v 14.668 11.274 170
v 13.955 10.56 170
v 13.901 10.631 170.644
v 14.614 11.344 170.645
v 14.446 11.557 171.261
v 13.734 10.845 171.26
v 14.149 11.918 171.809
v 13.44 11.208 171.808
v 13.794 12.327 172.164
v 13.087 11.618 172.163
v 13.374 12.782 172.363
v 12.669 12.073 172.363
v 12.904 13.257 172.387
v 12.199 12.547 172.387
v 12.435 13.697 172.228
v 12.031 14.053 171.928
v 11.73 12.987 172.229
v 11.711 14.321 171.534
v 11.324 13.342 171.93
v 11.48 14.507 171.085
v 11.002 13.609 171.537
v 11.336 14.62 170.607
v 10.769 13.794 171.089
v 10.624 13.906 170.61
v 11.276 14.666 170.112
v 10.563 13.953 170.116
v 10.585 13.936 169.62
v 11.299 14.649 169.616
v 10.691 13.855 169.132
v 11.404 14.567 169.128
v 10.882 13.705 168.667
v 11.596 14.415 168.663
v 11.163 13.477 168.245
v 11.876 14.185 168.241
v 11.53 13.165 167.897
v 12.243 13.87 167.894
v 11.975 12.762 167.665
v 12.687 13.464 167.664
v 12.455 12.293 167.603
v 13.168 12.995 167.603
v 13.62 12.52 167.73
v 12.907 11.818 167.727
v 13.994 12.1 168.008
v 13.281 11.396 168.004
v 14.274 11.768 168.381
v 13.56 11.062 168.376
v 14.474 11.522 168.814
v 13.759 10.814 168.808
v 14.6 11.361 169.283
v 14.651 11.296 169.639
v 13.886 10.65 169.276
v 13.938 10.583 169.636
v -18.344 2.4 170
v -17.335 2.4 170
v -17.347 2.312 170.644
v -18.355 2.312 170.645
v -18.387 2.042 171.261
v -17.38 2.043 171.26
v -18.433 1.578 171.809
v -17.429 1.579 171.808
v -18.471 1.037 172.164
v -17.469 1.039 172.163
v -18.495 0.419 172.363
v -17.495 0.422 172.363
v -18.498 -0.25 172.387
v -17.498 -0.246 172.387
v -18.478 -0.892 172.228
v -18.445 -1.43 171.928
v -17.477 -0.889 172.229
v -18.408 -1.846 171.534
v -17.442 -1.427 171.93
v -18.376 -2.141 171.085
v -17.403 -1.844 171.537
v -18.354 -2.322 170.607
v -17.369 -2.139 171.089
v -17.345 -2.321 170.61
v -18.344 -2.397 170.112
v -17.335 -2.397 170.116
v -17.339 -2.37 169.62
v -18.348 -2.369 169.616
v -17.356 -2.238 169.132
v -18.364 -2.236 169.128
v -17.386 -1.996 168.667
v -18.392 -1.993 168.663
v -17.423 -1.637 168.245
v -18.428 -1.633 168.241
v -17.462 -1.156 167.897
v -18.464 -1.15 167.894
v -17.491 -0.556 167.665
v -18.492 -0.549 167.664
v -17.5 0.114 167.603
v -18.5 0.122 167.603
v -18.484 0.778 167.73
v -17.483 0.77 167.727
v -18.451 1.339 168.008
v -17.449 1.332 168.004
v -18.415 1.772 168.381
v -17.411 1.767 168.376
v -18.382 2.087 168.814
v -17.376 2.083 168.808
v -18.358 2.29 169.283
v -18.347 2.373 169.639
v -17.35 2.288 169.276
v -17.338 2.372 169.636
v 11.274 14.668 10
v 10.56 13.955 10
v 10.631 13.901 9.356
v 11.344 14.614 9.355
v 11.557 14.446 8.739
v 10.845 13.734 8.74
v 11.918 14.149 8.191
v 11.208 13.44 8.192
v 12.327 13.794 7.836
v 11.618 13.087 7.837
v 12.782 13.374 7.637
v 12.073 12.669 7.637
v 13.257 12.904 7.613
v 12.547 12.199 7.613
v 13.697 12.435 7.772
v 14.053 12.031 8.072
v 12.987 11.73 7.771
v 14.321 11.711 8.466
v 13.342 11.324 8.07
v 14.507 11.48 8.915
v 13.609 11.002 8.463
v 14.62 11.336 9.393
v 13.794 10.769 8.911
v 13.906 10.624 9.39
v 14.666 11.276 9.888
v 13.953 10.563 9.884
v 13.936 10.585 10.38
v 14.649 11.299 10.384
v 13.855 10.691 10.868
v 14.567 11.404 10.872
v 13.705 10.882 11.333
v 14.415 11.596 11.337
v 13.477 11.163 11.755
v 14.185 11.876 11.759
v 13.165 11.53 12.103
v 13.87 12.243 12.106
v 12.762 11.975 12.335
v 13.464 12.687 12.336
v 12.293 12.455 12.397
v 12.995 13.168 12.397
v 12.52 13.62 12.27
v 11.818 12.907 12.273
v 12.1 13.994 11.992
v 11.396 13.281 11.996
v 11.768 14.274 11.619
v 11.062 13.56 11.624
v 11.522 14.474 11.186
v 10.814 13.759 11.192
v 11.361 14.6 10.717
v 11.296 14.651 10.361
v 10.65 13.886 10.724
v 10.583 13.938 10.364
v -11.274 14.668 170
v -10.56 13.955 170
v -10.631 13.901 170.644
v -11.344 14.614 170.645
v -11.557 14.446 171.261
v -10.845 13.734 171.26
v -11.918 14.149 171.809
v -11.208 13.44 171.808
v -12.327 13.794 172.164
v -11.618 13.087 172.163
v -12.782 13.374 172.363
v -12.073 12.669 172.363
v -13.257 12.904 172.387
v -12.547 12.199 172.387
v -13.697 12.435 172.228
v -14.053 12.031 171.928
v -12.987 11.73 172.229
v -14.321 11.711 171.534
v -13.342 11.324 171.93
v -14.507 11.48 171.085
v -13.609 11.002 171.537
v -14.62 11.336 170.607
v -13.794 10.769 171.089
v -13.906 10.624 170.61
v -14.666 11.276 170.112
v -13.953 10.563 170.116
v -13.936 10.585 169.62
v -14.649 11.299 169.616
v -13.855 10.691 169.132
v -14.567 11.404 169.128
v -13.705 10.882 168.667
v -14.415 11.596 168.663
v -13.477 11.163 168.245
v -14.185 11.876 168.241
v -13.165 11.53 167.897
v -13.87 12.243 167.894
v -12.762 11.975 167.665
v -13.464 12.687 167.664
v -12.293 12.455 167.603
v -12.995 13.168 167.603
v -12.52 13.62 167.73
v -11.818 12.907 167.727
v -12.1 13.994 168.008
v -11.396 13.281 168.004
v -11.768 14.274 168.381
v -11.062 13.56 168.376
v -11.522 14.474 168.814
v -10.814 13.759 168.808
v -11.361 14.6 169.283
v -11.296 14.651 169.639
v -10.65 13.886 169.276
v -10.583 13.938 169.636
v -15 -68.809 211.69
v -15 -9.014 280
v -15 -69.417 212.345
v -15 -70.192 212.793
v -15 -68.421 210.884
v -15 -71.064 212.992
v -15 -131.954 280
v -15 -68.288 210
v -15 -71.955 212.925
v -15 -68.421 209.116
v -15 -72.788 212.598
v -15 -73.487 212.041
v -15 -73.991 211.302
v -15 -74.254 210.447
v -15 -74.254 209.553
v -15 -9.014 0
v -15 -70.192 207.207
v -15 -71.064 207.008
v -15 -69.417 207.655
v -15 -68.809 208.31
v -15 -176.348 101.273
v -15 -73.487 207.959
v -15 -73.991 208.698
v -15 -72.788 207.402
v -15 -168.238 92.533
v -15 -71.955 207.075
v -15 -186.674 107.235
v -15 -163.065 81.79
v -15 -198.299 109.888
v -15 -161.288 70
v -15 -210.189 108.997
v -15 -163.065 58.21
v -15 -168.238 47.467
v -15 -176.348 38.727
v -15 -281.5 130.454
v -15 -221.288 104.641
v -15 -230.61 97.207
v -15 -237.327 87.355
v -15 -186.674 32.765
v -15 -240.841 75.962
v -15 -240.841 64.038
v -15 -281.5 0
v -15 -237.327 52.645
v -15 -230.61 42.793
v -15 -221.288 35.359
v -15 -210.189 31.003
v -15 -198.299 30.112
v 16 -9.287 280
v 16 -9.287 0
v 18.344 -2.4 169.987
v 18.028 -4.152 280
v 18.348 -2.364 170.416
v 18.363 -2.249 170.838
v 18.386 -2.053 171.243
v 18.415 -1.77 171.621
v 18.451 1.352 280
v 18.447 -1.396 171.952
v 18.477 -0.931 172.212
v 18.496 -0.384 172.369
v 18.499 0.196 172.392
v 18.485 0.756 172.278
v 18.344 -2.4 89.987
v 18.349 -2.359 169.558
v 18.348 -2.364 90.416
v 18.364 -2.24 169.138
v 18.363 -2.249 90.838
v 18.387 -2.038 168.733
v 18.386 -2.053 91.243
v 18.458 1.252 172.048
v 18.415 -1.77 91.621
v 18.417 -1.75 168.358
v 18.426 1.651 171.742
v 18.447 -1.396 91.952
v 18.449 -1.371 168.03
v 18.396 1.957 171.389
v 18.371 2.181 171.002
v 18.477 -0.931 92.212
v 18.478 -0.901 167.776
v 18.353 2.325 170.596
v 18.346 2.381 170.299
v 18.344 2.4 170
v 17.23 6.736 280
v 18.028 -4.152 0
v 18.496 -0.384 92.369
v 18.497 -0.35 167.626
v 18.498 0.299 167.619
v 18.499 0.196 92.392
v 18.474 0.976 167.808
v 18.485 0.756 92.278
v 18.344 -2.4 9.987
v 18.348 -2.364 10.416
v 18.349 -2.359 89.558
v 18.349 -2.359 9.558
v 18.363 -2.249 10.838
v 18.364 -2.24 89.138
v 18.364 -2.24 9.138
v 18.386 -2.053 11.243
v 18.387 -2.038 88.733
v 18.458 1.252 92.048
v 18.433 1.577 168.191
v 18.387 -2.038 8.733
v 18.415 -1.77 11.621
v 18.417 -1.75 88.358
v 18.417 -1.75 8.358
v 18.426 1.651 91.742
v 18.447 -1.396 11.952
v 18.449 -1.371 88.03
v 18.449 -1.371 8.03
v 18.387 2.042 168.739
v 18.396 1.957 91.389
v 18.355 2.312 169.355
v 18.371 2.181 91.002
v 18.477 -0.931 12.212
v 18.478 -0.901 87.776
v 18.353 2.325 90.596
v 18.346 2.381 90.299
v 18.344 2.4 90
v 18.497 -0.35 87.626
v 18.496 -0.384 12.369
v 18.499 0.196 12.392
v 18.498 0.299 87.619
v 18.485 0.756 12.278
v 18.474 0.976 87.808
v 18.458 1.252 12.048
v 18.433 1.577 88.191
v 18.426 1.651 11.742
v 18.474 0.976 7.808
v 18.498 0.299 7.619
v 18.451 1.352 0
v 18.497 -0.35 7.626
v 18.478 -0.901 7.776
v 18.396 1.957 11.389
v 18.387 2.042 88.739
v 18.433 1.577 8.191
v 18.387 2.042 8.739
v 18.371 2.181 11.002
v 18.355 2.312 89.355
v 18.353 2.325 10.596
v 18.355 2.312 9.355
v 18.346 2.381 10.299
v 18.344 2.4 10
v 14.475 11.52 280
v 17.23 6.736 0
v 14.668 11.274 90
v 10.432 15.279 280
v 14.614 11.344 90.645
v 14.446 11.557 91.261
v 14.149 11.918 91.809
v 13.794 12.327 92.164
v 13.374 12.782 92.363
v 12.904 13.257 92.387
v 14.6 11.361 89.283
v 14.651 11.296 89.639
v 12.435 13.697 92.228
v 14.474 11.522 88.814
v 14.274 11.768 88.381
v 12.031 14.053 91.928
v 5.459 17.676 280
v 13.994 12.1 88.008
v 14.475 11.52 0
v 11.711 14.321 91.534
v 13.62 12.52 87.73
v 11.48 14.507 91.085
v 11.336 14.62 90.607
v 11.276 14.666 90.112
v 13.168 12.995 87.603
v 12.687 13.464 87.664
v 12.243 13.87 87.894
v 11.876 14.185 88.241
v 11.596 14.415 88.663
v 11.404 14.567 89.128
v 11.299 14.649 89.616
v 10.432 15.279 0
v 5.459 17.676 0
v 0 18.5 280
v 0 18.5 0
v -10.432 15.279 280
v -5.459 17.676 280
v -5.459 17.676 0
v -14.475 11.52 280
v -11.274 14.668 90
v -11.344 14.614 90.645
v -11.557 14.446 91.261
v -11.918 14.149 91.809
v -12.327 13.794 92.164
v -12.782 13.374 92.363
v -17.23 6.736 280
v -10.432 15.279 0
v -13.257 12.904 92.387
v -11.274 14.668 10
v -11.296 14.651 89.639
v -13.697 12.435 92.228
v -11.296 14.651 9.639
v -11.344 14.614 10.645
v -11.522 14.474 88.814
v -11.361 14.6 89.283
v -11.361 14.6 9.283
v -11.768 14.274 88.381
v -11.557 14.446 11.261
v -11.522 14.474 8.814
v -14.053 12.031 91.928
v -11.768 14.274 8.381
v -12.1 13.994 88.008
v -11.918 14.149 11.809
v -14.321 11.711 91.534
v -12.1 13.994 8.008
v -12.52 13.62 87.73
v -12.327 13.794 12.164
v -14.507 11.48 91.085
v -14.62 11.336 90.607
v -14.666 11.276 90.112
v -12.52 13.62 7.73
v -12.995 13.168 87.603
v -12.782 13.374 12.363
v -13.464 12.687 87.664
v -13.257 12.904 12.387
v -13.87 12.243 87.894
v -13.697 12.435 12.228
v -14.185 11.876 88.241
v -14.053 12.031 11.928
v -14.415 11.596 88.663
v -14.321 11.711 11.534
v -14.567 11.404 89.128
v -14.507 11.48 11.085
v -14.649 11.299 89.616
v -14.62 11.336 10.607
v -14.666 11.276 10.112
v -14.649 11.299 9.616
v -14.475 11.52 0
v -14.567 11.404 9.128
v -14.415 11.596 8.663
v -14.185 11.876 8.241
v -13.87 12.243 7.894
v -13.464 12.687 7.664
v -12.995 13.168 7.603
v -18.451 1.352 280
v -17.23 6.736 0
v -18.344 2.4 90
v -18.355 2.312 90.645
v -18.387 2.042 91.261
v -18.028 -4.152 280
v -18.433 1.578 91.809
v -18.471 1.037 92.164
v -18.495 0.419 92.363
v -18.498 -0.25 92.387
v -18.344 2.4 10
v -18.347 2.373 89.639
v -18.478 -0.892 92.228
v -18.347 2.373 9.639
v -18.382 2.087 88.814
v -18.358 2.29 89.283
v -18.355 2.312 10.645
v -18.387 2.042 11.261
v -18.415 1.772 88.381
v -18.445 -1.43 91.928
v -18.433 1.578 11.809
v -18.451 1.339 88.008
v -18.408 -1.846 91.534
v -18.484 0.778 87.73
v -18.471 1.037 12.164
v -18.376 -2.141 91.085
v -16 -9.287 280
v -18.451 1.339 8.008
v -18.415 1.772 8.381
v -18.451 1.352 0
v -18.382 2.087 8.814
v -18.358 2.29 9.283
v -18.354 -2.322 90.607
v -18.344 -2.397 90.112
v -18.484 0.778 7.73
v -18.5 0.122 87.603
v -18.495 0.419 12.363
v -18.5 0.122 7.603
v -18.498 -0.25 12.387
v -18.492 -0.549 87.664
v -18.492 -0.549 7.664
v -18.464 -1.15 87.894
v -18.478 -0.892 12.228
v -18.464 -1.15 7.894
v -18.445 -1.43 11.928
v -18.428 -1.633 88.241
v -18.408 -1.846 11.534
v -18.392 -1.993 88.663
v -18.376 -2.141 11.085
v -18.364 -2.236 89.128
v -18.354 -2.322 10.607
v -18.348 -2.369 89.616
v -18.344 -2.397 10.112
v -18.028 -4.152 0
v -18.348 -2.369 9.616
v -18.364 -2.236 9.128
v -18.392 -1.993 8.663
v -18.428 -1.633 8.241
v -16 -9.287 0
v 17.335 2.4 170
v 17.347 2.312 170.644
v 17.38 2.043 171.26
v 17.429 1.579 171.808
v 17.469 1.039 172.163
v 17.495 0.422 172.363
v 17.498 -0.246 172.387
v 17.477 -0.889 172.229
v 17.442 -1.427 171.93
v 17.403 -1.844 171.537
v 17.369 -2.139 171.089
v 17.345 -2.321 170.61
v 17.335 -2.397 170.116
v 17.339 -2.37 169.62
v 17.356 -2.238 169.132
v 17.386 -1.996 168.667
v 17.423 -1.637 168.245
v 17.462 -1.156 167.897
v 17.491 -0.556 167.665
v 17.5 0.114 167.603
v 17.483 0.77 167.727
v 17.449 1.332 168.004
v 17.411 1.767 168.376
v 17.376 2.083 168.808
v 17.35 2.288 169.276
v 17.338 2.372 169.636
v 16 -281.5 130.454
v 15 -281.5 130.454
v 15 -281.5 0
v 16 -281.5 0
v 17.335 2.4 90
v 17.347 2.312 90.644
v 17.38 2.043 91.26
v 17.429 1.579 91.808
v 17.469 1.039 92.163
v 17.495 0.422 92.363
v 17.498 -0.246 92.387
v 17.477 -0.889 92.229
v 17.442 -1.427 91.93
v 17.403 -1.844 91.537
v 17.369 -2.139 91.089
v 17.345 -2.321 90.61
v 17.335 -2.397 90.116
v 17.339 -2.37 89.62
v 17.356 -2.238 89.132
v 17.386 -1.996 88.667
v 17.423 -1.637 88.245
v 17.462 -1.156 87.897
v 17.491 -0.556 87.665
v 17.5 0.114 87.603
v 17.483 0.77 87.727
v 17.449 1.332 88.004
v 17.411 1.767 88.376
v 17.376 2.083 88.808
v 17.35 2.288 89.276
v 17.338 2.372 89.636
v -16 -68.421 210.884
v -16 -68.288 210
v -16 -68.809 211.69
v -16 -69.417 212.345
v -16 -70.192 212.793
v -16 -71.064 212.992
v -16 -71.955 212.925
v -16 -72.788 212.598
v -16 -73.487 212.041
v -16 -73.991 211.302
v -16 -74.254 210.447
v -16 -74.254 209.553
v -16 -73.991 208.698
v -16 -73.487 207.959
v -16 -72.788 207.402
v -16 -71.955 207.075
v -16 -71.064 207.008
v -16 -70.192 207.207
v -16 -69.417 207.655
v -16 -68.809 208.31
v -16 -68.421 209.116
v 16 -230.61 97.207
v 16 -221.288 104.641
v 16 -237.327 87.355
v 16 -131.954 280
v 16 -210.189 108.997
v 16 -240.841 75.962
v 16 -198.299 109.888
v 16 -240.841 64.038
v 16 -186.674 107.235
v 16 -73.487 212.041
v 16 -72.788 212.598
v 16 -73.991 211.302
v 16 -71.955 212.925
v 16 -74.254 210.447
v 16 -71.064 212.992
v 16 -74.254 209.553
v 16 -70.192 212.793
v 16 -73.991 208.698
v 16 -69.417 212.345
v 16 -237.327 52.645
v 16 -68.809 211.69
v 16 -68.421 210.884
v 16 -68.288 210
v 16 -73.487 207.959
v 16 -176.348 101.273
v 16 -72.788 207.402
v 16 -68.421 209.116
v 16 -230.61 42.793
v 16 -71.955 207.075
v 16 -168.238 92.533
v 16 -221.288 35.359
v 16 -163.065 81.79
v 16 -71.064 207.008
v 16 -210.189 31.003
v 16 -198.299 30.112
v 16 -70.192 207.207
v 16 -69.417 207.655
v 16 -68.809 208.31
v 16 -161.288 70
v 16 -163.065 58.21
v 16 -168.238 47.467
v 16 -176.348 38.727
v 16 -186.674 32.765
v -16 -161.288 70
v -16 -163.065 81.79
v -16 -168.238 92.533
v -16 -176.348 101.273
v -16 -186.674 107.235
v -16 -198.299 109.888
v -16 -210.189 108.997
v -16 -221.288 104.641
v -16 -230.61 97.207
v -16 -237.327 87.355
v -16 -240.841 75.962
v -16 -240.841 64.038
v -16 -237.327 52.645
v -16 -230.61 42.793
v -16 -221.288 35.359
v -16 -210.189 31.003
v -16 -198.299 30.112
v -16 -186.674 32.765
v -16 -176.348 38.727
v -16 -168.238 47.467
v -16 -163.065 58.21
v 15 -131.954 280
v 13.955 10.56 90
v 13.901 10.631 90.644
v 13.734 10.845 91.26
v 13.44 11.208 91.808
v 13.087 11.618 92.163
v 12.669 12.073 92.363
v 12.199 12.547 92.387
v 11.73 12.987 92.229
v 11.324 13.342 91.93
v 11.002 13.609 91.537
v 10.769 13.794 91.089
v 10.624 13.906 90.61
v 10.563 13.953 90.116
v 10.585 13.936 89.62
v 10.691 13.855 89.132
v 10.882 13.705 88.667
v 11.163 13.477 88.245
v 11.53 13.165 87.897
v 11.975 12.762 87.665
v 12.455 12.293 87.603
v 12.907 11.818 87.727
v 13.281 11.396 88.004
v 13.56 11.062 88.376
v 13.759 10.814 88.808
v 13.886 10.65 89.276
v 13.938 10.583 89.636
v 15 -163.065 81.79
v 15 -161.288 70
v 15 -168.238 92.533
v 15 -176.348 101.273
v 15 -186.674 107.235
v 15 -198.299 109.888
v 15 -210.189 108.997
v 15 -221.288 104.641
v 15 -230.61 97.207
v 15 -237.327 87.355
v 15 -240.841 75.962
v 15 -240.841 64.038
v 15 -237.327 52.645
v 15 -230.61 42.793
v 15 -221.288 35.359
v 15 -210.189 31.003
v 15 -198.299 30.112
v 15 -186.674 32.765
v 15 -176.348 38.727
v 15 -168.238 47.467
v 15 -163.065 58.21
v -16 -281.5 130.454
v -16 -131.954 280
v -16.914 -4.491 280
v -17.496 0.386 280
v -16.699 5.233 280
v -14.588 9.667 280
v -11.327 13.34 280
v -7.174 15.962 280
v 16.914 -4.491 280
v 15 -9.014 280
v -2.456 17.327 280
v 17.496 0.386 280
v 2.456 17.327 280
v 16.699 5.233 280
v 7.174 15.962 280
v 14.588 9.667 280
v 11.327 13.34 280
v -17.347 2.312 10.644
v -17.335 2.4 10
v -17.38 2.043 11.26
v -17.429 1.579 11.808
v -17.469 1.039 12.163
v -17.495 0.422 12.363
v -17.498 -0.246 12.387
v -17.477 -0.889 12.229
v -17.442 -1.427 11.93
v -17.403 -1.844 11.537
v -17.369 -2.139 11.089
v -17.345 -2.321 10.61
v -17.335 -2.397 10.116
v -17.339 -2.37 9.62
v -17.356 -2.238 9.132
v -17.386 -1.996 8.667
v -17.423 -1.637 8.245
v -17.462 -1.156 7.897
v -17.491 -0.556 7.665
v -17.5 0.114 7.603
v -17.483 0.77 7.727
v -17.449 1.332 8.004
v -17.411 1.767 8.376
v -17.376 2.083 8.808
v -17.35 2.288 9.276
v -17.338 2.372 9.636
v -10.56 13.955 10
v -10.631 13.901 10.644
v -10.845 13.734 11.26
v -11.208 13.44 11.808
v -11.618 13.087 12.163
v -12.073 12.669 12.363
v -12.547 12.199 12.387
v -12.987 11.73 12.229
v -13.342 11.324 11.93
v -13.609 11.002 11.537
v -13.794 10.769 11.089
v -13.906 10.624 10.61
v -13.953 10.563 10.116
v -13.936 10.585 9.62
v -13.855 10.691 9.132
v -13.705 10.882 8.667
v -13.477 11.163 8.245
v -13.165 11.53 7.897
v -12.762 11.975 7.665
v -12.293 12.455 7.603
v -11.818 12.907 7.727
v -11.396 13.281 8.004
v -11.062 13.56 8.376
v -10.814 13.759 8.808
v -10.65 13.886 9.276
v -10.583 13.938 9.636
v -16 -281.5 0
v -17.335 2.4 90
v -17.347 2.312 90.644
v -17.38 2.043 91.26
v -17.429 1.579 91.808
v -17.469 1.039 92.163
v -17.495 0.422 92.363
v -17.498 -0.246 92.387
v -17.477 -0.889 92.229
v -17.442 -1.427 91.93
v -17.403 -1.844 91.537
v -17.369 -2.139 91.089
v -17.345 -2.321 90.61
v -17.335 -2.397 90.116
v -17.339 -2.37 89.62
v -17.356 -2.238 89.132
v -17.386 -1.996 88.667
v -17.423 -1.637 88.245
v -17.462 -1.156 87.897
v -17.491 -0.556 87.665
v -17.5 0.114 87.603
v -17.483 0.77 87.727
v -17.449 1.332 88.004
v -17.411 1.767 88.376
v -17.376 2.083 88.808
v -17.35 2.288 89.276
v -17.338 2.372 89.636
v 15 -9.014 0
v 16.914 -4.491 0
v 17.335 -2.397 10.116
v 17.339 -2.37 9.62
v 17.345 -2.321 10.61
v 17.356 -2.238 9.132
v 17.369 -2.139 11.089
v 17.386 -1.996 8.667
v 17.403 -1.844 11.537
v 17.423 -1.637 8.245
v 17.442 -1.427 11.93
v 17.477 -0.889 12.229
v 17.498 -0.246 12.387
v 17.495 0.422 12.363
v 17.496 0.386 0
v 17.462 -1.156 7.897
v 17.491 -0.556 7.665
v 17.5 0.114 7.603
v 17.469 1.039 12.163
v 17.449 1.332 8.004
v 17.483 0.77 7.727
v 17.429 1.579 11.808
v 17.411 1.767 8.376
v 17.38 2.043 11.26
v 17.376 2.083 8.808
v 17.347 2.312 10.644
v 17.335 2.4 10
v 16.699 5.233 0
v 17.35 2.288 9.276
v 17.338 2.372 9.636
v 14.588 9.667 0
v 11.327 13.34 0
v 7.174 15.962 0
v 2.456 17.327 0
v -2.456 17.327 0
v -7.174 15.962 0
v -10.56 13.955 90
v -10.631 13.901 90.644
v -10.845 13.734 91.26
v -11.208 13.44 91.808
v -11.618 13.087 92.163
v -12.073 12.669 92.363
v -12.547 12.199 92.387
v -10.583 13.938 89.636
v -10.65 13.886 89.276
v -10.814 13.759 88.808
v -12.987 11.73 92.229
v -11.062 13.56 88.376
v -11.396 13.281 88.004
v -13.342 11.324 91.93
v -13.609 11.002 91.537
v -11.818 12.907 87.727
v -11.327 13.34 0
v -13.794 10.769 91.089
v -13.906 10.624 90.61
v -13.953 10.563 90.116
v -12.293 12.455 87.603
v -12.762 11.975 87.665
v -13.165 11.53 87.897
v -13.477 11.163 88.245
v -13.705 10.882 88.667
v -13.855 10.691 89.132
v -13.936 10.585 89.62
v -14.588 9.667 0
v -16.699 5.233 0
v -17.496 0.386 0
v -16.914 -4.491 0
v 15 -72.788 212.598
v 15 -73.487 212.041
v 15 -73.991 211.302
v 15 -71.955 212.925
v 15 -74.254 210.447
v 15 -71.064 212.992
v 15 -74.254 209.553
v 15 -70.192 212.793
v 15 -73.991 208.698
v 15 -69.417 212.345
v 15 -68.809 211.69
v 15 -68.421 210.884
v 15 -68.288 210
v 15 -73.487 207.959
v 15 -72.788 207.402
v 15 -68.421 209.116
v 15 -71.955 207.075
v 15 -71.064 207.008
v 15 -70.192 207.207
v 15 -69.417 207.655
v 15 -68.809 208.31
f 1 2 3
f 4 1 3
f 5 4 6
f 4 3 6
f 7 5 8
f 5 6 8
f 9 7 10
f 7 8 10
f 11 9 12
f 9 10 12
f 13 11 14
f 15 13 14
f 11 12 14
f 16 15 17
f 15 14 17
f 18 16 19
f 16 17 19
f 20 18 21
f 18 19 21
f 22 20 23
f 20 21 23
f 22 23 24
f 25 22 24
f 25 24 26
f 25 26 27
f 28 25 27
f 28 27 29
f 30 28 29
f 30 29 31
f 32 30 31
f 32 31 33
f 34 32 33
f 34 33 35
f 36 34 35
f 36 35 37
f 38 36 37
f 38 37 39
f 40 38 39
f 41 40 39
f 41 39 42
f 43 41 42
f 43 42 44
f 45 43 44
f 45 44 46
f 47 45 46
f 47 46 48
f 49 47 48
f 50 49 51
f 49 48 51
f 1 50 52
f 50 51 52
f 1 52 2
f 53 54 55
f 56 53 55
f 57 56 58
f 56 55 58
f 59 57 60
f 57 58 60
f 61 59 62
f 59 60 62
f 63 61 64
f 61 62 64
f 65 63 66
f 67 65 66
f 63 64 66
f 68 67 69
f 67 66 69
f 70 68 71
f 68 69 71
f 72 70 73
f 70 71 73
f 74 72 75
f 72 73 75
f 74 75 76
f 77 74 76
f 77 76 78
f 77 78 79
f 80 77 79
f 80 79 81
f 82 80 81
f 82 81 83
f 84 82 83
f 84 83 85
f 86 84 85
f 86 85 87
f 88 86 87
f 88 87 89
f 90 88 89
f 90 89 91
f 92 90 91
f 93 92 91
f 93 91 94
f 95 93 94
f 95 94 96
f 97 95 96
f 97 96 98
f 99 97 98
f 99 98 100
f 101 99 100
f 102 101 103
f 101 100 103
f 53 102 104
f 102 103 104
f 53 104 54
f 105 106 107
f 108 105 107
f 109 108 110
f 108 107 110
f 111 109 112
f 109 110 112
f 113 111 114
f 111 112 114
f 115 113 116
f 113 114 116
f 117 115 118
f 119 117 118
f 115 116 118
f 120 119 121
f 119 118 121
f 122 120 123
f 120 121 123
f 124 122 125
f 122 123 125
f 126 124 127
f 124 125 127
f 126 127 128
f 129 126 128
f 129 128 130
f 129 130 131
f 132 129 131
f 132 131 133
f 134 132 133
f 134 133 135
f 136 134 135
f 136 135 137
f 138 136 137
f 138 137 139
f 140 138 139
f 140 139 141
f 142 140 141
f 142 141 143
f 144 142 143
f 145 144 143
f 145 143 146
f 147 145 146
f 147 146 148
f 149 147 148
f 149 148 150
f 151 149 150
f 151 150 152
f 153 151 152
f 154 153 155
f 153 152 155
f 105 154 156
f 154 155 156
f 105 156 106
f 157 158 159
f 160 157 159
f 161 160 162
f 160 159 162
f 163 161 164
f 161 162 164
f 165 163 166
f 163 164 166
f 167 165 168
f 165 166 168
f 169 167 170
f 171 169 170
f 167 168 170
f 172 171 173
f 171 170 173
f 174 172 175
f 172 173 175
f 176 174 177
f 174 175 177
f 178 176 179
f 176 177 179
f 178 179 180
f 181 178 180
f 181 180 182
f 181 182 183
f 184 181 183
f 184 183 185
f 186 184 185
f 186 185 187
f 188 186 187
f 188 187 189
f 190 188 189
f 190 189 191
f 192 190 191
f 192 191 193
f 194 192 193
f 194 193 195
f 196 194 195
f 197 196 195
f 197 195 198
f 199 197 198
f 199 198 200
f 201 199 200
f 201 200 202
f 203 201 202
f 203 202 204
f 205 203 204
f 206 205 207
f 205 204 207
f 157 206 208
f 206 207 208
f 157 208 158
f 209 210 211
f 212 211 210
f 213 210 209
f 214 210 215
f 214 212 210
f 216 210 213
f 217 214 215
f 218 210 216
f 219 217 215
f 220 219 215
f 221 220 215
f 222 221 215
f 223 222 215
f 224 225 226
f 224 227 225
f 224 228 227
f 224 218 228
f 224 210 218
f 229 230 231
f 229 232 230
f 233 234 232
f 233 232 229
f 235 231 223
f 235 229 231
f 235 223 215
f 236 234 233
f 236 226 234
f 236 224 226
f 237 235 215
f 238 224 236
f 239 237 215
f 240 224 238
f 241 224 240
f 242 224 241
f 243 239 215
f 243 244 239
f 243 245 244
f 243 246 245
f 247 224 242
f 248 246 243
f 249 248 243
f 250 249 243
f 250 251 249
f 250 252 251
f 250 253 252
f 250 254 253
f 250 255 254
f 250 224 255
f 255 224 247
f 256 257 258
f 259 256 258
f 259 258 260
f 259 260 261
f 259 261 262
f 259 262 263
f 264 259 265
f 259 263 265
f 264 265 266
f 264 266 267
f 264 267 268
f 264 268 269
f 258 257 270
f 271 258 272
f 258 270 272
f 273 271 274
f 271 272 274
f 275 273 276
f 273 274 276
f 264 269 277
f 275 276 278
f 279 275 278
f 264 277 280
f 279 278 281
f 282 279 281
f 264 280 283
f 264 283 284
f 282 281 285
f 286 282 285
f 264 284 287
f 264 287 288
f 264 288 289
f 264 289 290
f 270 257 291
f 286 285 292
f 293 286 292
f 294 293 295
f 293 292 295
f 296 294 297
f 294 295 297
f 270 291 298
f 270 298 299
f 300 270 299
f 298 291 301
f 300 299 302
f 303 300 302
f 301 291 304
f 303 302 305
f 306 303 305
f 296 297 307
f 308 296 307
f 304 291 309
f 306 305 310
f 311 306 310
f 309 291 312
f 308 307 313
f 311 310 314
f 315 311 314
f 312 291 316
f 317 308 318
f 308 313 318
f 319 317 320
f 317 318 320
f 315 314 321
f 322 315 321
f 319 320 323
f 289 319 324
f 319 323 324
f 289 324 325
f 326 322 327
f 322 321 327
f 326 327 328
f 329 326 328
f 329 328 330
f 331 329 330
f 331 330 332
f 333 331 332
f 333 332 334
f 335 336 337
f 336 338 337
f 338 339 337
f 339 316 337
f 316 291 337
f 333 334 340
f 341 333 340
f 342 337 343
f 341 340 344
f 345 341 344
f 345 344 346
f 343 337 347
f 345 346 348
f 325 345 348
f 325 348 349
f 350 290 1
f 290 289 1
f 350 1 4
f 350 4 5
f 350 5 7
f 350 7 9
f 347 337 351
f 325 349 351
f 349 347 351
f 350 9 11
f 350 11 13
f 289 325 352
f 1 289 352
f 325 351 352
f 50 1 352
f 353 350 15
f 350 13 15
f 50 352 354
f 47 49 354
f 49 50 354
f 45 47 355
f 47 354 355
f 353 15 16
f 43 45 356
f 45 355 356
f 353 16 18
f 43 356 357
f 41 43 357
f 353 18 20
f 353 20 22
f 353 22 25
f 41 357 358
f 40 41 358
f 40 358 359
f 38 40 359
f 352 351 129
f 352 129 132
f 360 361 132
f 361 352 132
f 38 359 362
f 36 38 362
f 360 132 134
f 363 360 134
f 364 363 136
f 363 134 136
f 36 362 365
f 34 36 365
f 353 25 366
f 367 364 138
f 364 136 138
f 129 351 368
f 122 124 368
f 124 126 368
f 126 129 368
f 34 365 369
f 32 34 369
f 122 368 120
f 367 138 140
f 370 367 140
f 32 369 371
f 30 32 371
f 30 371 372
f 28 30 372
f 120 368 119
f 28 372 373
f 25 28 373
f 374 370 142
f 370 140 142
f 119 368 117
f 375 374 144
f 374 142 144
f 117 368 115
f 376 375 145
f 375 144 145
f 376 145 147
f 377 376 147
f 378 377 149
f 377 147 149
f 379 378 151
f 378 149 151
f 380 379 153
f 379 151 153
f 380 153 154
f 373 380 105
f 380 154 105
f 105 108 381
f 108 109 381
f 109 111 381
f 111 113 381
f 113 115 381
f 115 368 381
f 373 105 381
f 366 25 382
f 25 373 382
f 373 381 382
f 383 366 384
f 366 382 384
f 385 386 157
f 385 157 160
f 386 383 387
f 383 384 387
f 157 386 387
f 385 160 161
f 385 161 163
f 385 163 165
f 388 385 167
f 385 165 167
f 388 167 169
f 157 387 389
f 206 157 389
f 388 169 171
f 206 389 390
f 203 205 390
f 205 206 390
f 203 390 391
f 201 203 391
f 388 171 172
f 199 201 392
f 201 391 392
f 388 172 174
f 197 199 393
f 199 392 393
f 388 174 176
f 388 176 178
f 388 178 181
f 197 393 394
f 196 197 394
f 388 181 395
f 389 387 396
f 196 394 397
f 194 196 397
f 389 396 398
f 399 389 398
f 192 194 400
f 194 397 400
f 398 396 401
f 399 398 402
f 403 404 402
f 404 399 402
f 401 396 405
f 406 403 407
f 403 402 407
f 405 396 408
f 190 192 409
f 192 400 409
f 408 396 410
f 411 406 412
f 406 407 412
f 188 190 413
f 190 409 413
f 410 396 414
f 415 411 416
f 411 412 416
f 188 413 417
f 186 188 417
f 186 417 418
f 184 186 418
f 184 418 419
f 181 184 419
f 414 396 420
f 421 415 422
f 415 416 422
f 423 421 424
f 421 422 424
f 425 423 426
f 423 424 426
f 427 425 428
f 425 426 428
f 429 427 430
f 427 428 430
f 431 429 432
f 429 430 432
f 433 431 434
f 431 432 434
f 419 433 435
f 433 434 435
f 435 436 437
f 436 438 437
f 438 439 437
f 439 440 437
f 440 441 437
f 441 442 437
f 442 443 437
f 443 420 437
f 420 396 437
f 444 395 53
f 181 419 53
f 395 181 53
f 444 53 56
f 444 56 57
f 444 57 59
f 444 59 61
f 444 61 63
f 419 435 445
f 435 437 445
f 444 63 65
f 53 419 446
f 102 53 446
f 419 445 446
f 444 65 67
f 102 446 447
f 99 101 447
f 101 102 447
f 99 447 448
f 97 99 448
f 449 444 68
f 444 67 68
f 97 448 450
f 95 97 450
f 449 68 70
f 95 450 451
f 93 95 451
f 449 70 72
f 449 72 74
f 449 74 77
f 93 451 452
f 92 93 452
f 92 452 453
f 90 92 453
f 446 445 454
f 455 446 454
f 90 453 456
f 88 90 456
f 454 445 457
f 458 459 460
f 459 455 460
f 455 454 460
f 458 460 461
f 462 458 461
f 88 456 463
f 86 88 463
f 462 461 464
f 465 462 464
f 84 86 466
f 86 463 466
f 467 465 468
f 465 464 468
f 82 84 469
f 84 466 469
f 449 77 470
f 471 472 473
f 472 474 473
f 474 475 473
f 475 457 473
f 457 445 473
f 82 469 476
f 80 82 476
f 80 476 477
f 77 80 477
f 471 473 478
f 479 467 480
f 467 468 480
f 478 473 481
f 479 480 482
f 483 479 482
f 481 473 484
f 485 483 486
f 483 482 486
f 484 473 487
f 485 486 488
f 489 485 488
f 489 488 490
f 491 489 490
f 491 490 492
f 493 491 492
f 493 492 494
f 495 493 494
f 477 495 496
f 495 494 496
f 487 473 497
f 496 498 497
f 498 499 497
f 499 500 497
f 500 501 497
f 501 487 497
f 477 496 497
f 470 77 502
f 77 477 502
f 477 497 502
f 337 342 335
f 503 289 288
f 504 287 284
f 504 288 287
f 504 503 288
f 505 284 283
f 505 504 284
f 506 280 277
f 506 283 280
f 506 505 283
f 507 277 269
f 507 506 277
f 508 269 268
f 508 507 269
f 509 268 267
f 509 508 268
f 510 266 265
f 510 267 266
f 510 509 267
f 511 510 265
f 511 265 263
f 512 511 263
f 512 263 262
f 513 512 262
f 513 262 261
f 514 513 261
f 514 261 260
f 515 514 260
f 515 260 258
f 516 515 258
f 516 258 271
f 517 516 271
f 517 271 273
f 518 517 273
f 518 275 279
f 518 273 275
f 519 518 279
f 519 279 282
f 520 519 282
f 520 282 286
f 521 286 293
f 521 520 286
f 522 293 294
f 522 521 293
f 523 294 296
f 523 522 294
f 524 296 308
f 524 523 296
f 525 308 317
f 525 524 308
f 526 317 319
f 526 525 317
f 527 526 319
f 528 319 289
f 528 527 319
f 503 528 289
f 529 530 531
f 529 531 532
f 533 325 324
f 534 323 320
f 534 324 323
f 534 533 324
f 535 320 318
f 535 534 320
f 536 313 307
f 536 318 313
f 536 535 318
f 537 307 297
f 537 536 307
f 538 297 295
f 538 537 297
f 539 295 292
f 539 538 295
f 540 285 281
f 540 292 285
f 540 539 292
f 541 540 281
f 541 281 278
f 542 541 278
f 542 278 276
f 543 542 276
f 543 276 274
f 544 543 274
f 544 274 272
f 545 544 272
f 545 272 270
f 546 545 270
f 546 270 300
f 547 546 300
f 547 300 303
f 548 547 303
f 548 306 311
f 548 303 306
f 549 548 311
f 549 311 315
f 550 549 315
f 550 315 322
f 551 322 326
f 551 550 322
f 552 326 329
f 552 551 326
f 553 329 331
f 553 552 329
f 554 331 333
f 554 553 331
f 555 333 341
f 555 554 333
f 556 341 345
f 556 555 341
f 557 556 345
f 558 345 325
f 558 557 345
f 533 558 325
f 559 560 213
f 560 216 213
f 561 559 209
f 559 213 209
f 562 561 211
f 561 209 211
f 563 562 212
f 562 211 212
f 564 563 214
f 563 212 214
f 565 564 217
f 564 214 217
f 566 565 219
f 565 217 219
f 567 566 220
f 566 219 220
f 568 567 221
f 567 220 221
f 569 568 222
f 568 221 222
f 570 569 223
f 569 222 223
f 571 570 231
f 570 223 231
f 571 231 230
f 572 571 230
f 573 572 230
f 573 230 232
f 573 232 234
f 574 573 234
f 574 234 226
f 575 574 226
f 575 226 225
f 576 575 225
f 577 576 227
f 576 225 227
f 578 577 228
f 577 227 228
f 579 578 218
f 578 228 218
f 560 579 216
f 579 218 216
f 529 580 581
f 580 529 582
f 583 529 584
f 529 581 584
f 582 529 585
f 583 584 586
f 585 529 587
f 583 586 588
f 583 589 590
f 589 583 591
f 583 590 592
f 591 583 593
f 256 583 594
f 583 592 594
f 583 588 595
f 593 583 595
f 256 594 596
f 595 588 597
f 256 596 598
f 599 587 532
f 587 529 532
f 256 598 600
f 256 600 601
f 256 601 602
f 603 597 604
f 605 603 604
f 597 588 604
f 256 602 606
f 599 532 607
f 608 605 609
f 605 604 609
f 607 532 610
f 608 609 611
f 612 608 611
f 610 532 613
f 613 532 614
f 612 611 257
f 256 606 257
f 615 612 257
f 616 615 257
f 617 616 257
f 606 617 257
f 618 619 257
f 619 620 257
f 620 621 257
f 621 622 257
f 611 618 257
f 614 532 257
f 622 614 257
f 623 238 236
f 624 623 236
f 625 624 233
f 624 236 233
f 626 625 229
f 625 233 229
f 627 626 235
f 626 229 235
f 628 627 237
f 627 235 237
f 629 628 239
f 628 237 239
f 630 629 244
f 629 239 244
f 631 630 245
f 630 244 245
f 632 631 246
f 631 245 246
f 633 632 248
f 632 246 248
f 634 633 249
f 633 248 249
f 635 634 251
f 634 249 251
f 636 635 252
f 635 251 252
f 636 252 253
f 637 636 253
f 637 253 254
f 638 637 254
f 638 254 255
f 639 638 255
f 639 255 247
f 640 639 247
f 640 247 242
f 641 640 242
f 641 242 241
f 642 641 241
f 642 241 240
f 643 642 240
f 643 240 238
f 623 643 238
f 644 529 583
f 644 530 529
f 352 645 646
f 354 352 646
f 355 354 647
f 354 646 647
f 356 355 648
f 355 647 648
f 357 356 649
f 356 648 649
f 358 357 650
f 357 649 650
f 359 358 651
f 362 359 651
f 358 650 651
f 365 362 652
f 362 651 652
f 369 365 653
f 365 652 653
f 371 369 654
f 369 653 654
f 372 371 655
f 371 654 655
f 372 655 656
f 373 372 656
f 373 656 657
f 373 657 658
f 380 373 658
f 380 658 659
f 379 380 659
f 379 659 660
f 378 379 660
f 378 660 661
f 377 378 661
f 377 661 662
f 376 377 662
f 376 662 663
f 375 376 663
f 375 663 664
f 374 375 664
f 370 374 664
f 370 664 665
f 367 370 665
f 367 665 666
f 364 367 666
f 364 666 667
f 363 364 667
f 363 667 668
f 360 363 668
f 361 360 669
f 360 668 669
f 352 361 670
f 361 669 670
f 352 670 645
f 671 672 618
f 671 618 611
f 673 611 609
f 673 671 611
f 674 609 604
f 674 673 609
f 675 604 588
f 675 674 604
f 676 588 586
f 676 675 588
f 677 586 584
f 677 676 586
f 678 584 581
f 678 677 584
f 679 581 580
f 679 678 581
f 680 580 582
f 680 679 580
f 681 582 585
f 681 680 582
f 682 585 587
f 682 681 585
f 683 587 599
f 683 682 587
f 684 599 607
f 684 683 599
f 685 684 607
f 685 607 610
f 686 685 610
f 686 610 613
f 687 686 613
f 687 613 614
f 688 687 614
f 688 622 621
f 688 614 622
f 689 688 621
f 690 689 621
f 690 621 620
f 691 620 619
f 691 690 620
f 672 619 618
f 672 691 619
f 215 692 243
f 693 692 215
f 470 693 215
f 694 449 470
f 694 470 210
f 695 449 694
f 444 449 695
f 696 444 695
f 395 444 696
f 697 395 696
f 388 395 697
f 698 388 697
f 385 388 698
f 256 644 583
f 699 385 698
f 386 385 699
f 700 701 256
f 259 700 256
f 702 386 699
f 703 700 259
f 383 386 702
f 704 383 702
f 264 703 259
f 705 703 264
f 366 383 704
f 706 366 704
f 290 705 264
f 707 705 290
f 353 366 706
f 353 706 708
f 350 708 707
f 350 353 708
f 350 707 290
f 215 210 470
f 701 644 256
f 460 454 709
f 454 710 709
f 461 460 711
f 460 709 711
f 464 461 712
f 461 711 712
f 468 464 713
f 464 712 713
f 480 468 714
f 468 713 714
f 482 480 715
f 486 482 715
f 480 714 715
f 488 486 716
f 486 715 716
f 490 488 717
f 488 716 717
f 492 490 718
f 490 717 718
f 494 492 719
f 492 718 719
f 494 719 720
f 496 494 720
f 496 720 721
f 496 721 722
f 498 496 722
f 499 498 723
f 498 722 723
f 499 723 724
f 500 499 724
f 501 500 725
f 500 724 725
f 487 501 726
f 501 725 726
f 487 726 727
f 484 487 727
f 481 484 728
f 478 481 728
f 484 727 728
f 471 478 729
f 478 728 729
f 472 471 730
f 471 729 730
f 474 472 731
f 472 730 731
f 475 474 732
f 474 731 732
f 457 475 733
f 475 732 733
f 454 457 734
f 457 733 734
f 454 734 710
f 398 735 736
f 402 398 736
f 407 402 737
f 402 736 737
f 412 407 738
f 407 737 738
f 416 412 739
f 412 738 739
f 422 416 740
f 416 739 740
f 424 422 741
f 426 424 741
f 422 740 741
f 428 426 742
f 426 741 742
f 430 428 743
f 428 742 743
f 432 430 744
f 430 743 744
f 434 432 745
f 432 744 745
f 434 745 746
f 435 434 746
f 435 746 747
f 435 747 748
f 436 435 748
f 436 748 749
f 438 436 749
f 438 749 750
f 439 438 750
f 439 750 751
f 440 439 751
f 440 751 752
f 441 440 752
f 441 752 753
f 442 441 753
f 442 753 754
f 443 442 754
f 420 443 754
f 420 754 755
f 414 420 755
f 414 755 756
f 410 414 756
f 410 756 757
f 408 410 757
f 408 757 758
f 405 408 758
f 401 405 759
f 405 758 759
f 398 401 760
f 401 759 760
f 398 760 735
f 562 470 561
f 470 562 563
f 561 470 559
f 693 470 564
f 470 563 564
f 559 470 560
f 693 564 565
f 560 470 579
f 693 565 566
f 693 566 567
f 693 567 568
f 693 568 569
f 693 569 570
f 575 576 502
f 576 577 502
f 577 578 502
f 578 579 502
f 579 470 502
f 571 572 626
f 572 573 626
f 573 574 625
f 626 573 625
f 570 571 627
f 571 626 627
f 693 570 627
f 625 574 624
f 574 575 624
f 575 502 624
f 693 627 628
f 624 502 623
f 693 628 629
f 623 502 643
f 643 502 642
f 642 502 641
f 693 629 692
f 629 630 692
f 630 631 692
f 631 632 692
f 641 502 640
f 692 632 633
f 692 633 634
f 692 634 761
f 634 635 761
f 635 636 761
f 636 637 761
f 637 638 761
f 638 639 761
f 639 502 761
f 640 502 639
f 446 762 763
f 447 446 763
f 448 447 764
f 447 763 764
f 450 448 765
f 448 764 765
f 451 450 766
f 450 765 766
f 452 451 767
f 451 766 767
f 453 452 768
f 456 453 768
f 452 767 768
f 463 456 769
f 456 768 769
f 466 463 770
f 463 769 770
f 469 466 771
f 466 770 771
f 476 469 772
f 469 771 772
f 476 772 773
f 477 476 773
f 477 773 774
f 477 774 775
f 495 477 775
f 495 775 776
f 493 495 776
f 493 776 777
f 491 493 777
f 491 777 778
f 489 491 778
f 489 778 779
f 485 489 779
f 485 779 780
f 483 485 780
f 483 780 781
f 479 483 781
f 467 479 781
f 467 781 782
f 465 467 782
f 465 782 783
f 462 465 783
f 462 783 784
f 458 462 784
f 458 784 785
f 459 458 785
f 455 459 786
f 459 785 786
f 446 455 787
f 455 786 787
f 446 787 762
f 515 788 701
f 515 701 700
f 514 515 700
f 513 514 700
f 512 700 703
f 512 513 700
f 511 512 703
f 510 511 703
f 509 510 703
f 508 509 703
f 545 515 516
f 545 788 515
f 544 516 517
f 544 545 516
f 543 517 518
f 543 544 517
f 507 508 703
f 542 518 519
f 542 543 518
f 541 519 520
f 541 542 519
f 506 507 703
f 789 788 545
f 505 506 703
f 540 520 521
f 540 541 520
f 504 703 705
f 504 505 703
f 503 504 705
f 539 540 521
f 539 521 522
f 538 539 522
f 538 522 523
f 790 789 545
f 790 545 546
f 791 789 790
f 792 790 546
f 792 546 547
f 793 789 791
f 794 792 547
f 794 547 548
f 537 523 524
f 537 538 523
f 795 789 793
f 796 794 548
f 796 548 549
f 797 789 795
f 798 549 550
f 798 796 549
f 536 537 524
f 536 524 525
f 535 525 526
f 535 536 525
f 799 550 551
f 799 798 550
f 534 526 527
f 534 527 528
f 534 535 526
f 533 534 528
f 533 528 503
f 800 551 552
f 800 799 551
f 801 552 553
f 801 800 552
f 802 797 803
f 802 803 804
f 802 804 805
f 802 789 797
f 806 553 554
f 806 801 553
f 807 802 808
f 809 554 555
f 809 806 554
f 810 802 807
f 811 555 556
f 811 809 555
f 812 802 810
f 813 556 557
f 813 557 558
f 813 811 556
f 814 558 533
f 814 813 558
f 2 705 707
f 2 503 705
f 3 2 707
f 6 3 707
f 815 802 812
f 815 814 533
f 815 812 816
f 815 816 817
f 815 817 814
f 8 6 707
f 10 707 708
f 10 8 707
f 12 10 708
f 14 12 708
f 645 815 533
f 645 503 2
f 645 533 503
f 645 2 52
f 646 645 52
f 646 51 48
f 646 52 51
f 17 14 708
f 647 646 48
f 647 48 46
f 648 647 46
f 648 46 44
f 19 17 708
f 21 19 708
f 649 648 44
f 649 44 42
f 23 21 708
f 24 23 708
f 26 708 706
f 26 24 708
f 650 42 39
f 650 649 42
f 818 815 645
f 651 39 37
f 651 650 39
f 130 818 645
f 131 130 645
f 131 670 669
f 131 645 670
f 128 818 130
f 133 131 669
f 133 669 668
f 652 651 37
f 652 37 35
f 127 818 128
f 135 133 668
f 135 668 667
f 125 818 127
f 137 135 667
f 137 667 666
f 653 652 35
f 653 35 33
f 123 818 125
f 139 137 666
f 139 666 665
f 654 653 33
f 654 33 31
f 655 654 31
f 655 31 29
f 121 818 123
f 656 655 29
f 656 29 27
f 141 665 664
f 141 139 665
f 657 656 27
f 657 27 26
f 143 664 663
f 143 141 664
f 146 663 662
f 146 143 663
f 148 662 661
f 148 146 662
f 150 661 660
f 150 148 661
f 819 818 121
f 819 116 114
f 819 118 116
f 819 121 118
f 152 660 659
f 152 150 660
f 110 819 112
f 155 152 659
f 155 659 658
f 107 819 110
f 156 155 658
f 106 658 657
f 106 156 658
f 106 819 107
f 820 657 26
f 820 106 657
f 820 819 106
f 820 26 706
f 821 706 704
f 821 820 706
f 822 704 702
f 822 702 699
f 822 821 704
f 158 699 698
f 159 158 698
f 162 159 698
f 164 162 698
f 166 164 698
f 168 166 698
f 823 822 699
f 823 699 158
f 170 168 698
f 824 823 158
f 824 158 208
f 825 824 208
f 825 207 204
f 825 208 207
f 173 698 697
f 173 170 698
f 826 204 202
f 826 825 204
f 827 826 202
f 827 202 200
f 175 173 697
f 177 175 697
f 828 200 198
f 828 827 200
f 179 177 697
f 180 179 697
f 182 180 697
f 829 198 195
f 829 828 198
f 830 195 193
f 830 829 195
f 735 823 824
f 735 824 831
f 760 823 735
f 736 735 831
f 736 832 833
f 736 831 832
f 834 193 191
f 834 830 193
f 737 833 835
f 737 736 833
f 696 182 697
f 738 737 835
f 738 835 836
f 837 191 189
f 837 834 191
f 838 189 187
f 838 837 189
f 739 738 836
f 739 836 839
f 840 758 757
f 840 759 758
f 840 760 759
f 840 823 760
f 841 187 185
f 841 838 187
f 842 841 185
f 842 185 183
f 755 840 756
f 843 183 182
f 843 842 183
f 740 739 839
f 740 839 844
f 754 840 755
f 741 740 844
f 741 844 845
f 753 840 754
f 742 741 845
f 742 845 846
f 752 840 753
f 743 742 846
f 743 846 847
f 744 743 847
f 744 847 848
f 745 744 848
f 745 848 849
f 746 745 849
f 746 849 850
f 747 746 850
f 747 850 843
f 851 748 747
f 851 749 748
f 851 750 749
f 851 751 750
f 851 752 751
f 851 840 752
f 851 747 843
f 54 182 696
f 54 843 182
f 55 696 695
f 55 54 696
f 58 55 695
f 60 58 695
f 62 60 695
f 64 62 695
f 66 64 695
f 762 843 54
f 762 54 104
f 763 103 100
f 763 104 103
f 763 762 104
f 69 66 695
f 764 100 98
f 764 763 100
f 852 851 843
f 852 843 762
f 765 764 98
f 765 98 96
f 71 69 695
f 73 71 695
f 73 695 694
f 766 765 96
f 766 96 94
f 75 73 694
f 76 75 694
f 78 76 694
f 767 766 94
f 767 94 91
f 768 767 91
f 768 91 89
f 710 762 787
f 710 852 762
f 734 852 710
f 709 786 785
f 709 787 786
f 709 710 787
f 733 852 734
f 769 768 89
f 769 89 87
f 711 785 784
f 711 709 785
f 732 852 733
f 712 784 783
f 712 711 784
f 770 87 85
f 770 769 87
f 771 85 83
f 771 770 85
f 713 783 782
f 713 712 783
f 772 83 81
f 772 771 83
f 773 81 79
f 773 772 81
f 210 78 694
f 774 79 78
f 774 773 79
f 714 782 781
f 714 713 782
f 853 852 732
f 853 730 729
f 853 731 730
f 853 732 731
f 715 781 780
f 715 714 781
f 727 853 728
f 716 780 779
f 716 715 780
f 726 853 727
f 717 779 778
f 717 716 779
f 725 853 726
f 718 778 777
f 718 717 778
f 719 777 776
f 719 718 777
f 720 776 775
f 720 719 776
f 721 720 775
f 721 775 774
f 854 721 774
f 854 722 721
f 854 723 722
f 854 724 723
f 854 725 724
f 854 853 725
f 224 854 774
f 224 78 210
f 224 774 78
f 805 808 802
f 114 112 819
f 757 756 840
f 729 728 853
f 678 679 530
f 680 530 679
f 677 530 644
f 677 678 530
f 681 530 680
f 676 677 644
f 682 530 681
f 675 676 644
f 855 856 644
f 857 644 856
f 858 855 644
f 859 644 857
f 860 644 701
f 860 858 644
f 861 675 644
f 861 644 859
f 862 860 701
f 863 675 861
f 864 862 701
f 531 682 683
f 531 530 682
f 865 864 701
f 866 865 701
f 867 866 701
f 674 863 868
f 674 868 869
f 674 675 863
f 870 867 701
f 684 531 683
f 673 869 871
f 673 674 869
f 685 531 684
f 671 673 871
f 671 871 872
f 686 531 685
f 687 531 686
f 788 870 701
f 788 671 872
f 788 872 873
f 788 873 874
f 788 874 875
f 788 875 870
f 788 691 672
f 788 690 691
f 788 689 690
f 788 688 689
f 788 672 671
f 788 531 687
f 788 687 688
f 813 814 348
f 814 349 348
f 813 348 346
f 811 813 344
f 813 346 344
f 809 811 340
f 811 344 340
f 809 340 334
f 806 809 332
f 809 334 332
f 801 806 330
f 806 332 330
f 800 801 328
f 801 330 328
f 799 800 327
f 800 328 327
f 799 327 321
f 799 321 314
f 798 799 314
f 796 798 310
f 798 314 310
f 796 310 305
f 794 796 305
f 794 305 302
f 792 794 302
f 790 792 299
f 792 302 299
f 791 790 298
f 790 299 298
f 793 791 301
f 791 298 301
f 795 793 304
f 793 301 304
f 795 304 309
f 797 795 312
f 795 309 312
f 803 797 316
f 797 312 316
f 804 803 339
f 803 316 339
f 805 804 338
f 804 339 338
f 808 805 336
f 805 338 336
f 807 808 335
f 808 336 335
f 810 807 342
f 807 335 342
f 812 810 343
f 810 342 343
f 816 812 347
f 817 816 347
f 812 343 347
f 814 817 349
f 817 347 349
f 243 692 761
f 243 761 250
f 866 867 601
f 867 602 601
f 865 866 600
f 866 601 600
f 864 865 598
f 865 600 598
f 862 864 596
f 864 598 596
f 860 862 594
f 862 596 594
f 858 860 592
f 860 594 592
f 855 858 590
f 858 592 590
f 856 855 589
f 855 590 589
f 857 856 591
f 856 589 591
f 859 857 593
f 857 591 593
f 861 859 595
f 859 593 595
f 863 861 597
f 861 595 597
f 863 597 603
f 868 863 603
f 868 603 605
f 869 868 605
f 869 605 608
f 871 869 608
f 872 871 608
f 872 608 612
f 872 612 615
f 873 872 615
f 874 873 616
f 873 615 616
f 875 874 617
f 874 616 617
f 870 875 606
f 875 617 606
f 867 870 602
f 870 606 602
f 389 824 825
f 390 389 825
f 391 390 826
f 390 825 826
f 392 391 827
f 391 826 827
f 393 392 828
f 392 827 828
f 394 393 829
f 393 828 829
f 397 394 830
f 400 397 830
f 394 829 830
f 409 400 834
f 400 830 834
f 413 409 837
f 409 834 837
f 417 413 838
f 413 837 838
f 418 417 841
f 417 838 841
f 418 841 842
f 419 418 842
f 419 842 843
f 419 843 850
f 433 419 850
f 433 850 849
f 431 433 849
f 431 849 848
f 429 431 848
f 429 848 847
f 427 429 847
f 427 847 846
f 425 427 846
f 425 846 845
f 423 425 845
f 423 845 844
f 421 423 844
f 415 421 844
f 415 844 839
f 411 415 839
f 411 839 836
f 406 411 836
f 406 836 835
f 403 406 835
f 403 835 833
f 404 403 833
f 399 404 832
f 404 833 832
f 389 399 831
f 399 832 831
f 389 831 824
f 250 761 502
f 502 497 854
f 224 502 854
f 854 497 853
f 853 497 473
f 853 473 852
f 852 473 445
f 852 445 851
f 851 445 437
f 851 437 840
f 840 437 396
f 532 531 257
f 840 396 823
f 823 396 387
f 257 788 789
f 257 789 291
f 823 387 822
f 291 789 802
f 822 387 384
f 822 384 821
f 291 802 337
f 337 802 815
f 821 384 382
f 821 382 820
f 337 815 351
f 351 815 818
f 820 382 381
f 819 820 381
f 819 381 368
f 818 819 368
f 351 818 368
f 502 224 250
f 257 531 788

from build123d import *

# Parameters (mm, degrees)
F3_DEPTH  = 280
F4_DEPTH  = 280
F5_R      = 2.4
F6_DEPTH  = 18.5
F8_DEPTH  = 25
F10_R     = 2.4
F11_DEPTH = 25
F12_R     = 40
F12_R_2   = 3
F13_DEPTH = 20


with BuildPart() as f3:
    # F2 (on Top) → F3 (new body)
    with BuildSketch(Plane.XY):
        with BuildLine():
            ThreePointArc((16, -9.2870878105), (0, 18.5), (-16, -9.2870878105))
            Line((-16, -9.2870878105), (-16, -18.5))
            Line((-16, -18.5), (-16, -281.5))
            Line((-16, -281.5), (16, -281.5))
            Line((16, -281.5), (16, -18.5))
            Line((16, -18.5), (16, -9.2870878105))
        make_face()
    extrude(amount=F3_DEPTH)

    # F0 (on Top) → F4 (cut)
    with BuildSketch(Plane.XY):
        with BuildLine():
            Line((15, -17.5), (15, -9.0138781887))
            ThreePointArc((15, -9.0138781887), (0, 17.5), (-15, -9.0138781887))
            Line((-15, -9.0138781887), (-15, -17.5))
            Line((-15, -17.5), (-15, -282.5))
            Line((-15, -282.5), (15, -282.5))
            Line((15, -282.5), (15, -17.5))
        make_face()
    extrude(amount=F4_DEPTH, mode=Mode.SUBTRACT)

    # F5 (on Right) → F6 (cut, symmetric)
    with BuildSketch(Plane.YZ):
        with Locations((0, 170)):
            Circle(F5_R)
        with Locations((0, 90)):
            Circle(F5_R)
        with Locations((0, 10)):
            Circle(F5_R)
    extrude(amount=F6_DEPTH, both=True, mode=Mode.SUBTRACT)

    # F7 (on face) → F8 (cut)
    with BuildSketch(Plane(origin=(0, 0, 0), x_dir=(0.7071067812, -0.7071067812, 0), z_dir=(-0.7071067812, -0.7071067812, 0))):
        with BuildLine():
            ThreePointArc((2.4, 10), (0, 12.4), (-2.4, 10))
            Line((-2.4, 10), (2.4, 10))
        make_face()
        with BuildLine():
            Line((2.4, 10), (-2.4, 10))
            ThreePointArc((-2.4, 10), (0, 7.6), (2.4, 10))
        make_face()
        with BuildLine():
            ThreePointArc((-2.4, 90), (0, 87.6), (2.4, 90))
            Line((2.4, 90), (-2.4, 90))
        make_face()
        with BuildLine():
            Line((-2.4, 90), (2.4, 90))
            ThreePointArc((2.4, 90), (0, 92.4), (-2.4, 90))
        make_face()
        with BuildLine():
            ThreePointArc((-2.4, 170), (0, 167.6), (2.4, 170))
            Line((2.4, 170), (-2.4, 170))
        make_face()
        with BuildLine():
            Line((-2.4, 170), (2.4, 170))
            ThreePointArc((2.4, 170), (0, 172.4), (-2.4, 170))
        make_face()
    extrude(amount=-F8_DEPTH, mode=Mode.SUBTRACT)

    # F10 (on face) → F11 (cut)
    with BuildSketch(Plane(origin=(0, 0, 0), x_dir=(0.7071067812, 0.7071067812, 0), z_dir=(0.7071067812, -0.7071067812, 0))):
        with Locations((0, 170)):
            Circle(F10_R)
        with Locations((0, 90)):
            Circle(F10_R)
        with Locations((0, 10)):
            Circle(F10_R)
    extrude(amount=-F11_DEPTH, mode=Mode.SUBTRACT)

    # F12 (on Right) → F13 (cut, symmetric)
    with BuildSketch(Plane.YZ):
        with Locations((-201.2879049778, 70)):
            Circle(F12_R)
        Polygon((-131.954, 280), (-281.954, 280), (-281.954, 130), align=None)
        with Locations((-71.2879049778, 210)):
            Circle(F12_R_2)
    extrude(amount=F13_DEPTH, both=True, mode=Mode.SUBTRACT)


solid = f3.part
